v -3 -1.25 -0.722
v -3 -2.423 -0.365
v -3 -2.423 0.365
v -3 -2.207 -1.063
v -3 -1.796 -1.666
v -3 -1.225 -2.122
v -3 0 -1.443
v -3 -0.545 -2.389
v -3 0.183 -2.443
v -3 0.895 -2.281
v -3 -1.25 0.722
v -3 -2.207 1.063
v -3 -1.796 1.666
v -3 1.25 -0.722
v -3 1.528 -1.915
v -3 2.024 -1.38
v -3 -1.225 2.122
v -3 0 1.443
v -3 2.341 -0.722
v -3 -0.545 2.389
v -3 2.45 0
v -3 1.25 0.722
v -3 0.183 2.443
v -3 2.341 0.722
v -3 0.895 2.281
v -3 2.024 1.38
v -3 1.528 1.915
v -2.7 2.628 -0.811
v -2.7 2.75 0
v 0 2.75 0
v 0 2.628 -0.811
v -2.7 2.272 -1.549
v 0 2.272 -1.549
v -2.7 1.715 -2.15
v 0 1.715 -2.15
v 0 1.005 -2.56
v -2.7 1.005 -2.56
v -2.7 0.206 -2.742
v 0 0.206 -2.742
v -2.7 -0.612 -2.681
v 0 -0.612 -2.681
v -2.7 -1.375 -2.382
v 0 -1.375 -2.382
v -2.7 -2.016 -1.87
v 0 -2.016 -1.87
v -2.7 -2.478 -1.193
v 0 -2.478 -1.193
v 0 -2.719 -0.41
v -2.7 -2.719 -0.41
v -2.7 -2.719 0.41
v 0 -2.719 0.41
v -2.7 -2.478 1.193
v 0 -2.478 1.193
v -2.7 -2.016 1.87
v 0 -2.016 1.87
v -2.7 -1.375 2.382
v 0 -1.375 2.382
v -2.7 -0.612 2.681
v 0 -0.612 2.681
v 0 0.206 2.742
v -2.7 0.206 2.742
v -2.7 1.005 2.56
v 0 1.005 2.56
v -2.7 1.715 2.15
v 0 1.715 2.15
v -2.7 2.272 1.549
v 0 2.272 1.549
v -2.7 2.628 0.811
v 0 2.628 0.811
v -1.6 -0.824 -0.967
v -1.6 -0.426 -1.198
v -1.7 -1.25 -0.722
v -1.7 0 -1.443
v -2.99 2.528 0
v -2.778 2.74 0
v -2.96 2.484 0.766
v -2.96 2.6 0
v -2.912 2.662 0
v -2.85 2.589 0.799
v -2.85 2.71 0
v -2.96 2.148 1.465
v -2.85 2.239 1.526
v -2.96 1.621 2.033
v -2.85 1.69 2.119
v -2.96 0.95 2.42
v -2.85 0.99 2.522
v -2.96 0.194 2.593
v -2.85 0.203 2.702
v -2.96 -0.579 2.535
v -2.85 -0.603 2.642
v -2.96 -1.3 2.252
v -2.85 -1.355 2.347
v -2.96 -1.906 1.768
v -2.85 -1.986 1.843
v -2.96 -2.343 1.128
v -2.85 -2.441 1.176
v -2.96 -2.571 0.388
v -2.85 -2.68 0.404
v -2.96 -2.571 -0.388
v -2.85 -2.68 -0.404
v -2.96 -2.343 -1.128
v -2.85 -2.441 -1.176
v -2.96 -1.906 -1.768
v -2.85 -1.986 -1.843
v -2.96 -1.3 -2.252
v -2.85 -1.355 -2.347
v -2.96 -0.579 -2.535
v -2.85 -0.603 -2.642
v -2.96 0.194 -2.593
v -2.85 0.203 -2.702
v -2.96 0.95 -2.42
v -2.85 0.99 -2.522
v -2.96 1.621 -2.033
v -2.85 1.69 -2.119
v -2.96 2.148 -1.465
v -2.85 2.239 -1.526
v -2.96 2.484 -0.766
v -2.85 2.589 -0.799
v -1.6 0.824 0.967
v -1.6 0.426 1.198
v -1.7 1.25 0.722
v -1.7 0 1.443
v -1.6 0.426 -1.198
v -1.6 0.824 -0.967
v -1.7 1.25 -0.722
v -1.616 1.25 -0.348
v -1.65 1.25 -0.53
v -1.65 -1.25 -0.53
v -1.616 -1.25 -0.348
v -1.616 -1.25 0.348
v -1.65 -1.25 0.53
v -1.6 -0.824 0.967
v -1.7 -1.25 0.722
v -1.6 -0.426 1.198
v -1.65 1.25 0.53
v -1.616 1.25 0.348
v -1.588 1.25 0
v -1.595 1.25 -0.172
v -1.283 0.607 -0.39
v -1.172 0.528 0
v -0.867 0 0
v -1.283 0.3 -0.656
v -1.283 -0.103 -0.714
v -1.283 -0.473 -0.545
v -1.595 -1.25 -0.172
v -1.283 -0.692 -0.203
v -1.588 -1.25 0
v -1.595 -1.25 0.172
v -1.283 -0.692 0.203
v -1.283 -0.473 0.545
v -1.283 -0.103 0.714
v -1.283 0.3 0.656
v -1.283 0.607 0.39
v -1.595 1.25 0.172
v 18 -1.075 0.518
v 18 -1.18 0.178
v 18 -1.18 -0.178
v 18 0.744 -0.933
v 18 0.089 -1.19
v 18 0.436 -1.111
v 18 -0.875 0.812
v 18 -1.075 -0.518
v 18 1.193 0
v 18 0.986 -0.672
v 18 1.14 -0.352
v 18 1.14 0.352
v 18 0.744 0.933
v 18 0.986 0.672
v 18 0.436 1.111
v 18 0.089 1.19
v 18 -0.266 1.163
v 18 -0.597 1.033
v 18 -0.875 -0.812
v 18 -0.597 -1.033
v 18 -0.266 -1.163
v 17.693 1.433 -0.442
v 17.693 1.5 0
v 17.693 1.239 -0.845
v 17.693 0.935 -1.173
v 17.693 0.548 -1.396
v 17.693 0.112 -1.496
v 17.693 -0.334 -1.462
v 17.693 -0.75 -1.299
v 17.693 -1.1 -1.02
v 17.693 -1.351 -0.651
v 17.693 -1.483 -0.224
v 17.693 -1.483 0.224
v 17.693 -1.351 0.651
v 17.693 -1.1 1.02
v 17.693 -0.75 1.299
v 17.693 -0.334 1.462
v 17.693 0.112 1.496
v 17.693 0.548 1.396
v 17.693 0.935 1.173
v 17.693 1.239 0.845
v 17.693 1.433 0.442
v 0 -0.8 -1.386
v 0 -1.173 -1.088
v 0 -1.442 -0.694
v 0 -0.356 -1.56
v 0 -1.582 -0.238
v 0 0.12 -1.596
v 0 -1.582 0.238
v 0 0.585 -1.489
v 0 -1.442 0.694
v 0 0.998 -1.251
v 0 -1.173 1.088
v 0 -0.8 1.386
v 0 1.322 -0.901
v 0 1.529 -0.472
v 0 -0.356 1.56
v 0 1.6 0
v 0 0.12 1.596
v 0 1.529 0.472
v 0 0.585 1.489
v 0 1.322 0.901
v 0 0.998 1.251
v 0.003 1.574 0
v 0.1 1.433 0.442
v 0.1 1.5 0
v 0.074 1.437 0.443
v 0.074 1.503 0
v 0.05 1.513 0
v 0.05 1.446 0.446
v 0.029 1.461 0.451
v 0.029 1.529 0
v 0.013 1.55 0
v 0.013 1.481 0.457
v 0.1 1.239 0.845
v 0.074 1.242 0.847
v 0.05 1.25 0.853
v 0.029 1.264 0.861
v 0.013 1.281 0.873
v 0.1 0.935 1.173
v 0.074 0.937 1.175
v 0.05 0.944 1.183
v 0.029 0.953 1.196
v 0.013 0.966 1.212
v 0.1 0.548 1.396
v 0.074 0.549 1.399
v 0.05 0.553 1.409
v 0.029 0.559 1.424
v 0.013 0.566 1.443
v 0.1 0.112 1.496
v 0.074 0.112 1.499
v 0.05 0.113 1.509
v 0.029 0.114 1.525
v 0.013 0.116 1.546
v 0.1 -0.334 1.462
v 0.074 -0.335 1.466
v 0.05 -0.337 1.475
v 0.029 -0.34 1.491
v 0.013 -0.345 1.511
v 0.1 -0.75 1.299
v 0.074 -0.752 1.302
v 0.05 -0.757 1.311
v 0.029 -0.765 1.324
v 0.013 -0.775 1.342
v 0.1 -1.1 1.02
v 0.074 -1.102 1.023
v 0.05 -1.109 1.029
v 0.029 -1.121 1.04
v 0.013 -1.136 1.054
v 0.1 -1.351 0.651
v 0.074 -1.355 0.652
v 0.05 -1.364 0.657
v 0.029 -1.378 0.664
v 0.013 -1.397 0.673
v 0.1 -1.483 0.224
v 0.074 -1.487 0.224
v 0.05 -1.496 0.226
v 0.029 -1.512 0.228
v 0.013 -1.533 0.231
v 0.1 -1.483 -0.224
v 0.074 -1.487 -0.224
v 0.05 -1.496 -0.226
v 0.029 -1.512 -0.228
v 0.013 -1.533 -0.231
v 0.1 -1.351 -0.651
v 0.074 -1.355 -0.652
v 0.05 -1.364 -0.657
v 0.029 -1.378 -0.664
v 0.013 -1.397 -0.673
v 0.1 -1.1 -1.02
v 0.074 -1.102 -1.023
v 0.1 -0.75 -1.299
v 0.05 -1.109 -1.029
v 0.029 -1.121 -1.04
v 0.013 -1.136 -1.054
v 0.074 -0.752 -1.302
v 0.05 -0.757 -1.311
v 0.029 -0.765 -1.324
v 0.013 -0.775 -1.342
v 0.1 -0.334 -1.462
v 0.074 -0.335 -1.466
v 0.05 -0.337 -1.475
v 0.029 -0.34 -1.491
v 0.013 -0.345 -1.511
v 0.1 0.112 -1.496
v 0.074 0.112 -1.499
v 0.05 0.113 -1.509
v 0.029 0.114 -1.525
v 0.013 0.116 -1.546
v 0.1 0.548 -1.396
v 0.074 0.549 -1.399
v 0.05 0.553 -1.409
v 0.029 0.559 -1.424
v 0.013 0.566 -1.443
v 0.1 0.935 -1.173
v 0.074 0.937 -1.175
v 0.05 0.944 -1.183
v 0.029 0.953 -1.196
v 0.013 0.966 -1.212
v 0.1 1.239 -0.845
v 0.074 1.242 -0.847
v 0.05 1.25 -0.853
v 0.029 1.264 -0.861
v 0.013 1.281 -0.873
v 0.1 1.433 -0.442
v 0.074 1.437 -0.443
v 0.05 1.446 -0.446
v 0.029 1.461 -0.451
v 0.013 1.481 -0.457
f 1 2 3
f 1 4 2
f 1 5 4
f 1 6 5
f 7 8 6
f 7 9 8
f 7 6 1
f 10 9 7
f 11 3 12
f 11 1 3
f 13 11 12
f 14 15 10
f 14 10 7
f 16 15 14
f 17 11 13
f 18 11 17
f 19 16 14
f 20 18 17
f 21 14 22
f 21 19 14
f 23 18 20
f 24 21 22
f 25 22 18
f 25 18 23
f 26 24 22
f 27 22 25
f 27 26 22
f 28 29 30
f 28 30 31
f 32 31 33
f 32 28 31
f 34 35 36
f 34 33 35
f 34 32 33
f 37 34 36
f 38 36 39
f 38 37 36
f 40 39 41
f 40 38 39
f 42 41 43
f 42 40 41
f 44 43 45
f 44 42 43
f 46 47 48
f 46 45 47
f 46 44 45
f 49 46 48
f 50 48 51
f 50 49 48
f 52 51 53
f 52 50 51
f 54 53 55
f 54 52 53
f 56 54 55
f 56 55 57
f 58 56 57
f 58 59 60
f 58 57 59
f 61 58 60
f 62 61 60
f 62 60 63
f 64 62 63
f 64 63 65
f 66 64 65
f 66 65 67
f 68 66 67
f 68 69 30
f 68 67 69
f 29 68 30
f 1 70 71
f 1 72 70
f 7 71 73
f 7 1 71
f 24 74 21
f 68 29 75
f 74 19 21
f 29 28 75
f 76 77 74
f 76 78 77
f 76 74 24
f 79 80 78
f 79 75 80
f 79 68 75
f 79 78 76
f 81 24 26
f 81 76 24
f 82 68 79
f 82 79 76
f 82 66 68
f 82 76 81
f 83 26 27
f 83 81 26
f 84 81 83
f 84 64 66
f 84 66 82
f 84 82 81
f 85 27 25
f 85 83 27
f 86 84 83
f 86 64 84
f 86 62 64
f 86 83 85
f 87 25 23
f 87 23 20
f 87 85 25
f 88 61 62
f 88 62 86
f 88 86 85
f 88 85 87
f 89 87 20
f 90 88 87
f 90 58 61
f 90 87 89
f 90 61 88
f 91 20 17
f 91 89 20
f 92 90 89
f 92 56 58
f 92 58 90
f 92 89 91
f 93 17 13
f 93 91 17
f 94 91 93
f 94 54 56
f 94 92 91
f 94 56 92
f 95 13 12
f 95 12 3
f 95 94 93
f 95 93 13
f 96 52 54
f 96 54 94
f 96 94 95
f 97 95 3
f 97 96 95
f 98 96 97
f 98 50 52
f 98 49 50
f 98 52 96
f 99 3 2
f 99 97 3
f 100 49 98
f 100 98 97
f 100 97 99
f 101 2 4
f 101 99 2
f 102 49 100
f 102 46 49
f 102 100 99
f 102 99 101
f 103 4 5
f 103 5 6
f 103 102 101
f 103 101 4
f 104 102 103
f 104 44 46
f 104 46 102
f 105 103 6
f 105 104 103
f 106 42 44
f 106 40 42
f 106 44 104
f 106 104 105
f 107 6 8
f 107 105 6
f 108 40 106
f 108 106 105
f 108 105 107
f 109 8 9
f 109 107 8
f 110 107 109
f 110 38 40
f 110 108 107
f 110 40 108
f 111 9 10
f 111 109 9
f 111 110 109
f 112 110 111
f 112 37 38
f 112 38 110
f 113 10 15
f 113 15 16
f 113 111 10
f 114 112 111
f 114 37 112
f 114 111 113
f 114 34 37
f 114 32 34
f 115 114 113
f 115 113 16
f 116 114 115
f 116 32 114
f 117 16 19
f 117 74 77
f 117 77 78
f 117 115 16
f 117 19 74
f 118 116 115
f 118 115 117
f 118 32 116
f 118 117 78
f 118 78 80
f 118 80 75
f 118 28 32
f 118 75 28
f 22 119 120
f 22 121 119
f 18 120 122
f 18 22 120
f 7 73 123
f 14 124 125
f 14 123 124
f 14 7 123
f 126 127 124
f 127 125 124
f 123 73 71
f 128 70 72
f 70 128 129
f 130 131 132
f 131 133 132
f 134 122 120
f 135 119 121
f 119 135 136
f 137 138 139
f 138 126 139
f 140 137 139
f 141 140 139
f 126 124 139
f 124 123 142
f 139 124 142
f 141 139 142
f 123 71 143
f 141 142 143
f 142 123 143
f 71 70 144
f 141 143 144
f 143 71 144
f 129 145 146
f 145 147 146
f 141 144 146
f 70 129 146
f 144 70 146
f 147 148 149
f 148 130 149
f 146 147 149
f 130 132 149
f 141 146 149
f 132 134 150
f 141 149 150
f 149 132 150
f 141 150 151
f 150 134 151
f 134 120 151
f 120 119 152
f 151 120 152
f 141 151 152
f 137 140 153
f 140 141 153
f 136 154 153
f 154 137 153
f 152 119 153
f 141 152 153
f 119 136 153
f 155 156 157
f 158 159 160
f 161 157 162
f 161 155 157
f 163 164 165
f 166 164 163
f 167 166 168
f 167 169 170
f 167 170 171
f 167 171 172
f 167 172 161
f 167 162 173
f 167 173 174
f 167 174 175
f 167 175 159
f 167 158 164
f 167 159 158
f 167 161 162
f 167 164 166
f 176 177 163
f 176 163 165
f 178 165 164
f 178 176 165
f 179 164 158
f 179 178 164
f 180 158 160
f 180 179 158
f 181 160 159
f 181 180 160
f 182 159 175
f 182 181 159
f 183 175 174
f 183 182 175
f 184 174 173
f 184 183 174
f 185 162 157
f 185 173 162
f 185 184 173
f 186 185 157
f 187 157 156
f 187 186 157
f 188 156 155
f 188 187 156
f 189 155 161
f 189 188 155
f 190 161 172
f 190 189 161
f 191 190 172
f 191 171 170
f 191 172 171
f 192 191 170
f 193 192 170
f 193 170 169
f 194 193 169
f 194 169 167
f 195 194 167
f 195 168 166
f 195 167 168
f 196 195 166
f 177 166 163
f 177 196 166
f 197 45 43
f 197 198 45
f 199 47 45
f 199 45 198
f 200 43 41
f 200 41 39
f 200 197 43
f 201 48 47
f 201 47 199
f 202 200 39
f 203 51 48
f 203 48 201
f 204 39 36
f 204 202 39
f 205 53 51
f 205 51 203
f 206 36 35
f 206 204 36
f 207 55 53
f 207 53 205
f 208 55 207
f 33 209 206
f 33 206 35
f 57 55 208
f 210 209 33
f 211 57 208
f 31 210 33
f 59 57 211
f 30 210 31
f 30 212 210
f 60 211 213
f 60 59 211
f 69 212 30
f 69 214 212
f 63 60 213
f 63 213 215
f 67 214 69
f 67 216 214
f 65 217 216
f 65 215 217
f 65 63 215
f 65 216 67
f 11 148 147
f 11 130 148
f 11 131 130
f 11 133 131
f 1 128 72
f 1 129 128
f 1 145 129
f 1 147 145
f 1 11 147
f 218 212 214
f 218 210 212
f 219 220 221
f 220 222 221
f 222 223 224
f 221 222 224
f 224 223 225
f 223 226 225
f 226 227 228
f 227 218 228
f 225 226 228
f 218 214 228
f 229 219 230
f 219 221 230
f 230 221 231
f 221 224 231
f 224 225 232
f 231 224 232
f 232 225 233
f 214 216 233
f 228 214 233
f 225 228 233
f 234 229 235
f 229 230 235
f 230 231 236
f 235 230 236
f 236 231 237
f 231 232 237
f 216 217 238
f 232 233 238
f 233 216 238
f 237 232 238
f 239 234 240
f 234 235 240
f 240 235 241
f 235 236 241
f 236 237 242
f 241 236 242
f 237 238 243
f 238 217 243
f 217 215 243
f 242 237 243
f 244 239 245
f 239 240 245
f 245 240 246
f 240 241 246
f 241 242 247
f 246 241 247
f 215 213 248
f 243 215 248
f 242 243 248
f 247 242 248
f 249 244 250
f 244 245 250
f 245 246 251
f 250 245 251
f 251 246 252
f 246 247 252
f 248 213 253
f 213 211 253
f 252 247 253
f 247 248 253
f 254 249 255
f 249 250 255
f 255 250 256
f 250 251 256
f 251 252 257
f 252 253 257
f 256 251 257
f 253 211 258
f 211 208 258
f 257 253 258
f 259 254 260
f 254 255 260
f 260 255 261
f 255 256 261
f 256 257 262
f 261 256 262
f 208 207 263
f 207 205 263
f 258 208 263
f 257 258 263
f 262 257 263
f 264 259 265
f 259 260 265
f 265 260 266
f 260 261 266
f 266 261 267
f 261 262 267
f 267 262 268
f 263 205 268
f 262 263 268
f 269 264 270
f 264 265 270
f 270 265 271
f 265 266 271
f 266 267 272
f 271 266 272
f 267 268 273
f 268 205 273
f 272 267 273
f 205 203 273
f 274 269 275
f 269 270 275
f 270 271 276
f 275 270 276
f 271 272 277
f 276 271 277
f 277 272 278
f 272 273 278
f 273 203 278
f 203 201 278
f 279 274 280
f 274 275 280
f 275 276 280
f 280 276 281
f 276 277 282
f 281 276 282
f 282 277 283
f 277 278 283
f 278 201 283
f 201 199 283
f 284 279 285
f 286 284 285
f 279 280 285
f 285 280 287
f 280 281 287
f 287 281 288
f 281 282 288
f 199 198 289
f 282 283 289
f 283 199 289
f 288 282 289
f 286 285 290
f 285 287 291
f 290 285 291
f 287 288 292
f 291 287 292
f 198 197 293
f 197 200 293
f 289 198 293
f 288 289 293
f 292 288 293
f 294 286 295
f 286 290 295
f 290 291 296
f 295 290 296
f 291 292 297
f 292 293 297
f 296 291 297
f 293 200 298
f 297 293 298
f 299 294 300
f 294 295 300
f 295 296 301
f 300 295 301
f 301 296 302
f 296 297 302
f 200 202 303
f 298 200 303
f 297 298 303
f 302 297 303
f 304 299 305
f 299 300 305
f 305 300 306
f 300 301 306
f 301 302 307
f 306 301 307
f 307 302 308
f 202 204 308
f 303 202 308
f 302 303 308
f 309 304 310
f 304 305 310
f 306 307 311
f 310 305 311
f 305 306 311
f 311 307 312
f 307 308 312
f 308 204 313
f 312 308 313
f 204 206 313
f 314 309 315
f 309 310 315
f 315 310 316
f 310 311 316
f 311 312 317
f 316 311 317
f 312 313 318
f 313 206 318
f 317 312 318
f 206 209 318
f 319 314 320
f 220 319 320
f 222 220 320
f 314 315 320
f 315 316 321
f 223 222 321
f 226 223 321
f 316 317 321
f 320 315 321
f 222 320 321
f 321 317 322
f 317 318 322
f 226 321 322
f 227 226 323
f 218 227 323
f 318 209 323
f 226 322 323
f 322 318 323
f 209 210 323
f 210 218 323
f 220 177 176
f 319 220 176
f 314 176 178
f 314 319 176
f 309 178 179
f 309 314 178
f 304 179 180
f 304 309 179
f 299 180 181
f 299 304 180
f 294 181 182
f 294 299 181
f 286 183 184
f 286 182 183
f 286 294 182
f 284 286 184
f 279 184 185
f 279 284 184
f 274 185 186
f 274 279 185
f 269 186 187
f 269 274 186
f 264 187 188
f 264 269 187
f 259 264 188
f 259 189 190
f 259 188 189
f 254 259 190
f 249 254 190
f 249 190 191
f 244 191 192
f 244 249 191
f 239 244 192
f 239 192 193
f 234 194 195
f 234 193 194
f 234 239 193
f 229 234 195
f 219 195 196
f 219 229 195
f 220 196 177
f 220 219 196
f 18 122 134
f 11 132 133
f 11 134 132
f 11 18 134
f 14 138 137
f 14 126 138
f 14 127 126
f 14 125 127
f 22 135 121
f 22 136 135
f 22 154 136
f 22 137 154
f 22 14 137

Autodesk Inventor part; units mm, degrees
ref_plane "YZ Plane" through (0, 0, 0) normal (1, 0, 0) x (0, 1, 0)
ref_plane "XZ Plane" through (0, 0, 0) normal (0, 1, 0) x (-1, 0, 0)
sketch "Sketch1" plane through (0, 0, 0) normal (0, 0, 1) x (1, 0, 0)
  line L0 (-0.8667, 0) -> (18, 0)
  line L1 (18, 0) -> (18, 1.5)
  line L2 (18, 1.5) -> (11.25, 1.5)
  line L3 (11.25, 1.5) -> (10.9432, 1.5)
  line L4 (10.9432, 1.5) -> (0, 1.5)
  line L5 (0, 1.5) -> (0, 2.75)
  line L6 (0, 2.75) -> (-3, 2.75)
  line L7 (-3, 2.75) -> (-3, 1.4434)
  line L8 (-3, 1.4434) -> (-1.7, 1.4434)
  line L9 (-1.7, 1.4434) -> (-0.8667, 0)
  line L10 (-7.2, 0) -> (22.2, 0) projected
  line L11 (0, -0.55) -> (0, 3.3) projected
  line L12 (11.25, 1.5) -> (0, 1.5) construction
  dimension "d1" = 6.75
  dimension "d2" = 0.3068
  dimension "d3" = 3
  dimension "d4" = 1.3
  dimension "d5" = 60
  dimension "d6" = 3
  dimension "d7" = 3
  dimension "d8" = 2.8868
  dimension "d9" = 5.5
  dimension "d26" = 18
revolve "Body" add sketch "Sketch1" angle 360 about axis through (-0.8667, 0, 0) along (1, 0, 0)
sketch "Sketch2" plane through (-3, 0, 0) normal (-1, 0, 0) x (0, 0, 1)
  circle A0 centre (0, 0) radius 1.4434 projected
  line L0 (0, -3.85) -> (0, 3.85) projected
  line L1 (-3.85, 0) -> (3.85, 0) projected
  line L2 (1.4434, 0) -> (0.7217, -1.25)
  line L3 (0.7217, -1.25) -> (-0.7217, -1.25)
  line L4 (-0.7217, -1.25) -> (-1.4434, 0)
  line L5 (-1.4434, 0) -> (-0.7217, 1.25)
  line L6 (-0.7217, 1.25) -> (0.7217, 1.25)
  line L7 (0.7217, 1.25) -> (1.4434, 0)
extrude "Slot" add sketch "Sketch2" against normal up to next contours L7 A0 | A0 L2 | L6 L0 A0 | A0 L0 L3 | L0 L6 A0 | A0 L3 L0 | L4 A0 | A0 L5
fillet "Fillet1" radius 0.3 1 edges at (-3, -2.75, 0)
thread "Thread" size "M3x0.5" class "6g" standard "ISO Metric profile" length 6.75
chamfer "Chamfer1" distance 0.3067 distance2 0.3067 1 edges at (18, -1.5, 0) measured on face at (18, -0.4645, -0.4115)
ref_plane "Work Plane1" through (29, 0, 0) normal (0, -1, 0) x (1, 0, 0)
fillet "Fillet2" radius 0.1 1 edges at (0, -1.5, 0)
equation "\"d1\" = GEL"
equation "\"d3\" = KOH"
equation "\"d4\" = INTI"
equation "\"d6\" = GD"
equation "\"d7\" = BDM"
equation "\"d8\" = 1.1547 * SW"
equation "\"d9\" = KOD"
equation "\"d30\" = R"
equation "\"d17\" = RR"
equation "\"d13\" = GEL"
equation "\"d15\" = -0.5 * SPD + 0.5 * GD"
equation "\"d16\" = GUL"
equation "\"GD\" = NND"
equation "\"NLG\" = 8"
equation "\"GEL\" = 6.75"
equation "\"KOD\" = 5.5"
equation "\"KOH\" = NND"
equation "\"INTI\" = 1.3"
equation "\"GAL\" = 0.61345 * PTC"
equation "\"GUL\" = 0.61345 * PTC"
equation "\"BDM\" = NND"
equation "\"SW\" = 2.5"
equation "\"RR\" = 0.1 * NND"
equation "\"SPD\" = NND - 1.2269 * PTC"
equation "\"R\" = 0.1"
equation "\"PHH\" = 0.13"
equation "\"GD1\" = THREADDIA - 1.2269 * PTC"
equation "\"THREADDIA\" = 3"
equation "\"FAWI\" = 45deg"
equation "\"PTC\" = 0.5"
equation "\"KOH1\" = 2.7"
equation "\"NND\" = 3"
equation "\"TOA\" = 30deg"
equation "\"E0\" = 1.155 * SW"
properties part number "AS 1420 - 1973 - M3 x 8" material "Steel, Mild"
